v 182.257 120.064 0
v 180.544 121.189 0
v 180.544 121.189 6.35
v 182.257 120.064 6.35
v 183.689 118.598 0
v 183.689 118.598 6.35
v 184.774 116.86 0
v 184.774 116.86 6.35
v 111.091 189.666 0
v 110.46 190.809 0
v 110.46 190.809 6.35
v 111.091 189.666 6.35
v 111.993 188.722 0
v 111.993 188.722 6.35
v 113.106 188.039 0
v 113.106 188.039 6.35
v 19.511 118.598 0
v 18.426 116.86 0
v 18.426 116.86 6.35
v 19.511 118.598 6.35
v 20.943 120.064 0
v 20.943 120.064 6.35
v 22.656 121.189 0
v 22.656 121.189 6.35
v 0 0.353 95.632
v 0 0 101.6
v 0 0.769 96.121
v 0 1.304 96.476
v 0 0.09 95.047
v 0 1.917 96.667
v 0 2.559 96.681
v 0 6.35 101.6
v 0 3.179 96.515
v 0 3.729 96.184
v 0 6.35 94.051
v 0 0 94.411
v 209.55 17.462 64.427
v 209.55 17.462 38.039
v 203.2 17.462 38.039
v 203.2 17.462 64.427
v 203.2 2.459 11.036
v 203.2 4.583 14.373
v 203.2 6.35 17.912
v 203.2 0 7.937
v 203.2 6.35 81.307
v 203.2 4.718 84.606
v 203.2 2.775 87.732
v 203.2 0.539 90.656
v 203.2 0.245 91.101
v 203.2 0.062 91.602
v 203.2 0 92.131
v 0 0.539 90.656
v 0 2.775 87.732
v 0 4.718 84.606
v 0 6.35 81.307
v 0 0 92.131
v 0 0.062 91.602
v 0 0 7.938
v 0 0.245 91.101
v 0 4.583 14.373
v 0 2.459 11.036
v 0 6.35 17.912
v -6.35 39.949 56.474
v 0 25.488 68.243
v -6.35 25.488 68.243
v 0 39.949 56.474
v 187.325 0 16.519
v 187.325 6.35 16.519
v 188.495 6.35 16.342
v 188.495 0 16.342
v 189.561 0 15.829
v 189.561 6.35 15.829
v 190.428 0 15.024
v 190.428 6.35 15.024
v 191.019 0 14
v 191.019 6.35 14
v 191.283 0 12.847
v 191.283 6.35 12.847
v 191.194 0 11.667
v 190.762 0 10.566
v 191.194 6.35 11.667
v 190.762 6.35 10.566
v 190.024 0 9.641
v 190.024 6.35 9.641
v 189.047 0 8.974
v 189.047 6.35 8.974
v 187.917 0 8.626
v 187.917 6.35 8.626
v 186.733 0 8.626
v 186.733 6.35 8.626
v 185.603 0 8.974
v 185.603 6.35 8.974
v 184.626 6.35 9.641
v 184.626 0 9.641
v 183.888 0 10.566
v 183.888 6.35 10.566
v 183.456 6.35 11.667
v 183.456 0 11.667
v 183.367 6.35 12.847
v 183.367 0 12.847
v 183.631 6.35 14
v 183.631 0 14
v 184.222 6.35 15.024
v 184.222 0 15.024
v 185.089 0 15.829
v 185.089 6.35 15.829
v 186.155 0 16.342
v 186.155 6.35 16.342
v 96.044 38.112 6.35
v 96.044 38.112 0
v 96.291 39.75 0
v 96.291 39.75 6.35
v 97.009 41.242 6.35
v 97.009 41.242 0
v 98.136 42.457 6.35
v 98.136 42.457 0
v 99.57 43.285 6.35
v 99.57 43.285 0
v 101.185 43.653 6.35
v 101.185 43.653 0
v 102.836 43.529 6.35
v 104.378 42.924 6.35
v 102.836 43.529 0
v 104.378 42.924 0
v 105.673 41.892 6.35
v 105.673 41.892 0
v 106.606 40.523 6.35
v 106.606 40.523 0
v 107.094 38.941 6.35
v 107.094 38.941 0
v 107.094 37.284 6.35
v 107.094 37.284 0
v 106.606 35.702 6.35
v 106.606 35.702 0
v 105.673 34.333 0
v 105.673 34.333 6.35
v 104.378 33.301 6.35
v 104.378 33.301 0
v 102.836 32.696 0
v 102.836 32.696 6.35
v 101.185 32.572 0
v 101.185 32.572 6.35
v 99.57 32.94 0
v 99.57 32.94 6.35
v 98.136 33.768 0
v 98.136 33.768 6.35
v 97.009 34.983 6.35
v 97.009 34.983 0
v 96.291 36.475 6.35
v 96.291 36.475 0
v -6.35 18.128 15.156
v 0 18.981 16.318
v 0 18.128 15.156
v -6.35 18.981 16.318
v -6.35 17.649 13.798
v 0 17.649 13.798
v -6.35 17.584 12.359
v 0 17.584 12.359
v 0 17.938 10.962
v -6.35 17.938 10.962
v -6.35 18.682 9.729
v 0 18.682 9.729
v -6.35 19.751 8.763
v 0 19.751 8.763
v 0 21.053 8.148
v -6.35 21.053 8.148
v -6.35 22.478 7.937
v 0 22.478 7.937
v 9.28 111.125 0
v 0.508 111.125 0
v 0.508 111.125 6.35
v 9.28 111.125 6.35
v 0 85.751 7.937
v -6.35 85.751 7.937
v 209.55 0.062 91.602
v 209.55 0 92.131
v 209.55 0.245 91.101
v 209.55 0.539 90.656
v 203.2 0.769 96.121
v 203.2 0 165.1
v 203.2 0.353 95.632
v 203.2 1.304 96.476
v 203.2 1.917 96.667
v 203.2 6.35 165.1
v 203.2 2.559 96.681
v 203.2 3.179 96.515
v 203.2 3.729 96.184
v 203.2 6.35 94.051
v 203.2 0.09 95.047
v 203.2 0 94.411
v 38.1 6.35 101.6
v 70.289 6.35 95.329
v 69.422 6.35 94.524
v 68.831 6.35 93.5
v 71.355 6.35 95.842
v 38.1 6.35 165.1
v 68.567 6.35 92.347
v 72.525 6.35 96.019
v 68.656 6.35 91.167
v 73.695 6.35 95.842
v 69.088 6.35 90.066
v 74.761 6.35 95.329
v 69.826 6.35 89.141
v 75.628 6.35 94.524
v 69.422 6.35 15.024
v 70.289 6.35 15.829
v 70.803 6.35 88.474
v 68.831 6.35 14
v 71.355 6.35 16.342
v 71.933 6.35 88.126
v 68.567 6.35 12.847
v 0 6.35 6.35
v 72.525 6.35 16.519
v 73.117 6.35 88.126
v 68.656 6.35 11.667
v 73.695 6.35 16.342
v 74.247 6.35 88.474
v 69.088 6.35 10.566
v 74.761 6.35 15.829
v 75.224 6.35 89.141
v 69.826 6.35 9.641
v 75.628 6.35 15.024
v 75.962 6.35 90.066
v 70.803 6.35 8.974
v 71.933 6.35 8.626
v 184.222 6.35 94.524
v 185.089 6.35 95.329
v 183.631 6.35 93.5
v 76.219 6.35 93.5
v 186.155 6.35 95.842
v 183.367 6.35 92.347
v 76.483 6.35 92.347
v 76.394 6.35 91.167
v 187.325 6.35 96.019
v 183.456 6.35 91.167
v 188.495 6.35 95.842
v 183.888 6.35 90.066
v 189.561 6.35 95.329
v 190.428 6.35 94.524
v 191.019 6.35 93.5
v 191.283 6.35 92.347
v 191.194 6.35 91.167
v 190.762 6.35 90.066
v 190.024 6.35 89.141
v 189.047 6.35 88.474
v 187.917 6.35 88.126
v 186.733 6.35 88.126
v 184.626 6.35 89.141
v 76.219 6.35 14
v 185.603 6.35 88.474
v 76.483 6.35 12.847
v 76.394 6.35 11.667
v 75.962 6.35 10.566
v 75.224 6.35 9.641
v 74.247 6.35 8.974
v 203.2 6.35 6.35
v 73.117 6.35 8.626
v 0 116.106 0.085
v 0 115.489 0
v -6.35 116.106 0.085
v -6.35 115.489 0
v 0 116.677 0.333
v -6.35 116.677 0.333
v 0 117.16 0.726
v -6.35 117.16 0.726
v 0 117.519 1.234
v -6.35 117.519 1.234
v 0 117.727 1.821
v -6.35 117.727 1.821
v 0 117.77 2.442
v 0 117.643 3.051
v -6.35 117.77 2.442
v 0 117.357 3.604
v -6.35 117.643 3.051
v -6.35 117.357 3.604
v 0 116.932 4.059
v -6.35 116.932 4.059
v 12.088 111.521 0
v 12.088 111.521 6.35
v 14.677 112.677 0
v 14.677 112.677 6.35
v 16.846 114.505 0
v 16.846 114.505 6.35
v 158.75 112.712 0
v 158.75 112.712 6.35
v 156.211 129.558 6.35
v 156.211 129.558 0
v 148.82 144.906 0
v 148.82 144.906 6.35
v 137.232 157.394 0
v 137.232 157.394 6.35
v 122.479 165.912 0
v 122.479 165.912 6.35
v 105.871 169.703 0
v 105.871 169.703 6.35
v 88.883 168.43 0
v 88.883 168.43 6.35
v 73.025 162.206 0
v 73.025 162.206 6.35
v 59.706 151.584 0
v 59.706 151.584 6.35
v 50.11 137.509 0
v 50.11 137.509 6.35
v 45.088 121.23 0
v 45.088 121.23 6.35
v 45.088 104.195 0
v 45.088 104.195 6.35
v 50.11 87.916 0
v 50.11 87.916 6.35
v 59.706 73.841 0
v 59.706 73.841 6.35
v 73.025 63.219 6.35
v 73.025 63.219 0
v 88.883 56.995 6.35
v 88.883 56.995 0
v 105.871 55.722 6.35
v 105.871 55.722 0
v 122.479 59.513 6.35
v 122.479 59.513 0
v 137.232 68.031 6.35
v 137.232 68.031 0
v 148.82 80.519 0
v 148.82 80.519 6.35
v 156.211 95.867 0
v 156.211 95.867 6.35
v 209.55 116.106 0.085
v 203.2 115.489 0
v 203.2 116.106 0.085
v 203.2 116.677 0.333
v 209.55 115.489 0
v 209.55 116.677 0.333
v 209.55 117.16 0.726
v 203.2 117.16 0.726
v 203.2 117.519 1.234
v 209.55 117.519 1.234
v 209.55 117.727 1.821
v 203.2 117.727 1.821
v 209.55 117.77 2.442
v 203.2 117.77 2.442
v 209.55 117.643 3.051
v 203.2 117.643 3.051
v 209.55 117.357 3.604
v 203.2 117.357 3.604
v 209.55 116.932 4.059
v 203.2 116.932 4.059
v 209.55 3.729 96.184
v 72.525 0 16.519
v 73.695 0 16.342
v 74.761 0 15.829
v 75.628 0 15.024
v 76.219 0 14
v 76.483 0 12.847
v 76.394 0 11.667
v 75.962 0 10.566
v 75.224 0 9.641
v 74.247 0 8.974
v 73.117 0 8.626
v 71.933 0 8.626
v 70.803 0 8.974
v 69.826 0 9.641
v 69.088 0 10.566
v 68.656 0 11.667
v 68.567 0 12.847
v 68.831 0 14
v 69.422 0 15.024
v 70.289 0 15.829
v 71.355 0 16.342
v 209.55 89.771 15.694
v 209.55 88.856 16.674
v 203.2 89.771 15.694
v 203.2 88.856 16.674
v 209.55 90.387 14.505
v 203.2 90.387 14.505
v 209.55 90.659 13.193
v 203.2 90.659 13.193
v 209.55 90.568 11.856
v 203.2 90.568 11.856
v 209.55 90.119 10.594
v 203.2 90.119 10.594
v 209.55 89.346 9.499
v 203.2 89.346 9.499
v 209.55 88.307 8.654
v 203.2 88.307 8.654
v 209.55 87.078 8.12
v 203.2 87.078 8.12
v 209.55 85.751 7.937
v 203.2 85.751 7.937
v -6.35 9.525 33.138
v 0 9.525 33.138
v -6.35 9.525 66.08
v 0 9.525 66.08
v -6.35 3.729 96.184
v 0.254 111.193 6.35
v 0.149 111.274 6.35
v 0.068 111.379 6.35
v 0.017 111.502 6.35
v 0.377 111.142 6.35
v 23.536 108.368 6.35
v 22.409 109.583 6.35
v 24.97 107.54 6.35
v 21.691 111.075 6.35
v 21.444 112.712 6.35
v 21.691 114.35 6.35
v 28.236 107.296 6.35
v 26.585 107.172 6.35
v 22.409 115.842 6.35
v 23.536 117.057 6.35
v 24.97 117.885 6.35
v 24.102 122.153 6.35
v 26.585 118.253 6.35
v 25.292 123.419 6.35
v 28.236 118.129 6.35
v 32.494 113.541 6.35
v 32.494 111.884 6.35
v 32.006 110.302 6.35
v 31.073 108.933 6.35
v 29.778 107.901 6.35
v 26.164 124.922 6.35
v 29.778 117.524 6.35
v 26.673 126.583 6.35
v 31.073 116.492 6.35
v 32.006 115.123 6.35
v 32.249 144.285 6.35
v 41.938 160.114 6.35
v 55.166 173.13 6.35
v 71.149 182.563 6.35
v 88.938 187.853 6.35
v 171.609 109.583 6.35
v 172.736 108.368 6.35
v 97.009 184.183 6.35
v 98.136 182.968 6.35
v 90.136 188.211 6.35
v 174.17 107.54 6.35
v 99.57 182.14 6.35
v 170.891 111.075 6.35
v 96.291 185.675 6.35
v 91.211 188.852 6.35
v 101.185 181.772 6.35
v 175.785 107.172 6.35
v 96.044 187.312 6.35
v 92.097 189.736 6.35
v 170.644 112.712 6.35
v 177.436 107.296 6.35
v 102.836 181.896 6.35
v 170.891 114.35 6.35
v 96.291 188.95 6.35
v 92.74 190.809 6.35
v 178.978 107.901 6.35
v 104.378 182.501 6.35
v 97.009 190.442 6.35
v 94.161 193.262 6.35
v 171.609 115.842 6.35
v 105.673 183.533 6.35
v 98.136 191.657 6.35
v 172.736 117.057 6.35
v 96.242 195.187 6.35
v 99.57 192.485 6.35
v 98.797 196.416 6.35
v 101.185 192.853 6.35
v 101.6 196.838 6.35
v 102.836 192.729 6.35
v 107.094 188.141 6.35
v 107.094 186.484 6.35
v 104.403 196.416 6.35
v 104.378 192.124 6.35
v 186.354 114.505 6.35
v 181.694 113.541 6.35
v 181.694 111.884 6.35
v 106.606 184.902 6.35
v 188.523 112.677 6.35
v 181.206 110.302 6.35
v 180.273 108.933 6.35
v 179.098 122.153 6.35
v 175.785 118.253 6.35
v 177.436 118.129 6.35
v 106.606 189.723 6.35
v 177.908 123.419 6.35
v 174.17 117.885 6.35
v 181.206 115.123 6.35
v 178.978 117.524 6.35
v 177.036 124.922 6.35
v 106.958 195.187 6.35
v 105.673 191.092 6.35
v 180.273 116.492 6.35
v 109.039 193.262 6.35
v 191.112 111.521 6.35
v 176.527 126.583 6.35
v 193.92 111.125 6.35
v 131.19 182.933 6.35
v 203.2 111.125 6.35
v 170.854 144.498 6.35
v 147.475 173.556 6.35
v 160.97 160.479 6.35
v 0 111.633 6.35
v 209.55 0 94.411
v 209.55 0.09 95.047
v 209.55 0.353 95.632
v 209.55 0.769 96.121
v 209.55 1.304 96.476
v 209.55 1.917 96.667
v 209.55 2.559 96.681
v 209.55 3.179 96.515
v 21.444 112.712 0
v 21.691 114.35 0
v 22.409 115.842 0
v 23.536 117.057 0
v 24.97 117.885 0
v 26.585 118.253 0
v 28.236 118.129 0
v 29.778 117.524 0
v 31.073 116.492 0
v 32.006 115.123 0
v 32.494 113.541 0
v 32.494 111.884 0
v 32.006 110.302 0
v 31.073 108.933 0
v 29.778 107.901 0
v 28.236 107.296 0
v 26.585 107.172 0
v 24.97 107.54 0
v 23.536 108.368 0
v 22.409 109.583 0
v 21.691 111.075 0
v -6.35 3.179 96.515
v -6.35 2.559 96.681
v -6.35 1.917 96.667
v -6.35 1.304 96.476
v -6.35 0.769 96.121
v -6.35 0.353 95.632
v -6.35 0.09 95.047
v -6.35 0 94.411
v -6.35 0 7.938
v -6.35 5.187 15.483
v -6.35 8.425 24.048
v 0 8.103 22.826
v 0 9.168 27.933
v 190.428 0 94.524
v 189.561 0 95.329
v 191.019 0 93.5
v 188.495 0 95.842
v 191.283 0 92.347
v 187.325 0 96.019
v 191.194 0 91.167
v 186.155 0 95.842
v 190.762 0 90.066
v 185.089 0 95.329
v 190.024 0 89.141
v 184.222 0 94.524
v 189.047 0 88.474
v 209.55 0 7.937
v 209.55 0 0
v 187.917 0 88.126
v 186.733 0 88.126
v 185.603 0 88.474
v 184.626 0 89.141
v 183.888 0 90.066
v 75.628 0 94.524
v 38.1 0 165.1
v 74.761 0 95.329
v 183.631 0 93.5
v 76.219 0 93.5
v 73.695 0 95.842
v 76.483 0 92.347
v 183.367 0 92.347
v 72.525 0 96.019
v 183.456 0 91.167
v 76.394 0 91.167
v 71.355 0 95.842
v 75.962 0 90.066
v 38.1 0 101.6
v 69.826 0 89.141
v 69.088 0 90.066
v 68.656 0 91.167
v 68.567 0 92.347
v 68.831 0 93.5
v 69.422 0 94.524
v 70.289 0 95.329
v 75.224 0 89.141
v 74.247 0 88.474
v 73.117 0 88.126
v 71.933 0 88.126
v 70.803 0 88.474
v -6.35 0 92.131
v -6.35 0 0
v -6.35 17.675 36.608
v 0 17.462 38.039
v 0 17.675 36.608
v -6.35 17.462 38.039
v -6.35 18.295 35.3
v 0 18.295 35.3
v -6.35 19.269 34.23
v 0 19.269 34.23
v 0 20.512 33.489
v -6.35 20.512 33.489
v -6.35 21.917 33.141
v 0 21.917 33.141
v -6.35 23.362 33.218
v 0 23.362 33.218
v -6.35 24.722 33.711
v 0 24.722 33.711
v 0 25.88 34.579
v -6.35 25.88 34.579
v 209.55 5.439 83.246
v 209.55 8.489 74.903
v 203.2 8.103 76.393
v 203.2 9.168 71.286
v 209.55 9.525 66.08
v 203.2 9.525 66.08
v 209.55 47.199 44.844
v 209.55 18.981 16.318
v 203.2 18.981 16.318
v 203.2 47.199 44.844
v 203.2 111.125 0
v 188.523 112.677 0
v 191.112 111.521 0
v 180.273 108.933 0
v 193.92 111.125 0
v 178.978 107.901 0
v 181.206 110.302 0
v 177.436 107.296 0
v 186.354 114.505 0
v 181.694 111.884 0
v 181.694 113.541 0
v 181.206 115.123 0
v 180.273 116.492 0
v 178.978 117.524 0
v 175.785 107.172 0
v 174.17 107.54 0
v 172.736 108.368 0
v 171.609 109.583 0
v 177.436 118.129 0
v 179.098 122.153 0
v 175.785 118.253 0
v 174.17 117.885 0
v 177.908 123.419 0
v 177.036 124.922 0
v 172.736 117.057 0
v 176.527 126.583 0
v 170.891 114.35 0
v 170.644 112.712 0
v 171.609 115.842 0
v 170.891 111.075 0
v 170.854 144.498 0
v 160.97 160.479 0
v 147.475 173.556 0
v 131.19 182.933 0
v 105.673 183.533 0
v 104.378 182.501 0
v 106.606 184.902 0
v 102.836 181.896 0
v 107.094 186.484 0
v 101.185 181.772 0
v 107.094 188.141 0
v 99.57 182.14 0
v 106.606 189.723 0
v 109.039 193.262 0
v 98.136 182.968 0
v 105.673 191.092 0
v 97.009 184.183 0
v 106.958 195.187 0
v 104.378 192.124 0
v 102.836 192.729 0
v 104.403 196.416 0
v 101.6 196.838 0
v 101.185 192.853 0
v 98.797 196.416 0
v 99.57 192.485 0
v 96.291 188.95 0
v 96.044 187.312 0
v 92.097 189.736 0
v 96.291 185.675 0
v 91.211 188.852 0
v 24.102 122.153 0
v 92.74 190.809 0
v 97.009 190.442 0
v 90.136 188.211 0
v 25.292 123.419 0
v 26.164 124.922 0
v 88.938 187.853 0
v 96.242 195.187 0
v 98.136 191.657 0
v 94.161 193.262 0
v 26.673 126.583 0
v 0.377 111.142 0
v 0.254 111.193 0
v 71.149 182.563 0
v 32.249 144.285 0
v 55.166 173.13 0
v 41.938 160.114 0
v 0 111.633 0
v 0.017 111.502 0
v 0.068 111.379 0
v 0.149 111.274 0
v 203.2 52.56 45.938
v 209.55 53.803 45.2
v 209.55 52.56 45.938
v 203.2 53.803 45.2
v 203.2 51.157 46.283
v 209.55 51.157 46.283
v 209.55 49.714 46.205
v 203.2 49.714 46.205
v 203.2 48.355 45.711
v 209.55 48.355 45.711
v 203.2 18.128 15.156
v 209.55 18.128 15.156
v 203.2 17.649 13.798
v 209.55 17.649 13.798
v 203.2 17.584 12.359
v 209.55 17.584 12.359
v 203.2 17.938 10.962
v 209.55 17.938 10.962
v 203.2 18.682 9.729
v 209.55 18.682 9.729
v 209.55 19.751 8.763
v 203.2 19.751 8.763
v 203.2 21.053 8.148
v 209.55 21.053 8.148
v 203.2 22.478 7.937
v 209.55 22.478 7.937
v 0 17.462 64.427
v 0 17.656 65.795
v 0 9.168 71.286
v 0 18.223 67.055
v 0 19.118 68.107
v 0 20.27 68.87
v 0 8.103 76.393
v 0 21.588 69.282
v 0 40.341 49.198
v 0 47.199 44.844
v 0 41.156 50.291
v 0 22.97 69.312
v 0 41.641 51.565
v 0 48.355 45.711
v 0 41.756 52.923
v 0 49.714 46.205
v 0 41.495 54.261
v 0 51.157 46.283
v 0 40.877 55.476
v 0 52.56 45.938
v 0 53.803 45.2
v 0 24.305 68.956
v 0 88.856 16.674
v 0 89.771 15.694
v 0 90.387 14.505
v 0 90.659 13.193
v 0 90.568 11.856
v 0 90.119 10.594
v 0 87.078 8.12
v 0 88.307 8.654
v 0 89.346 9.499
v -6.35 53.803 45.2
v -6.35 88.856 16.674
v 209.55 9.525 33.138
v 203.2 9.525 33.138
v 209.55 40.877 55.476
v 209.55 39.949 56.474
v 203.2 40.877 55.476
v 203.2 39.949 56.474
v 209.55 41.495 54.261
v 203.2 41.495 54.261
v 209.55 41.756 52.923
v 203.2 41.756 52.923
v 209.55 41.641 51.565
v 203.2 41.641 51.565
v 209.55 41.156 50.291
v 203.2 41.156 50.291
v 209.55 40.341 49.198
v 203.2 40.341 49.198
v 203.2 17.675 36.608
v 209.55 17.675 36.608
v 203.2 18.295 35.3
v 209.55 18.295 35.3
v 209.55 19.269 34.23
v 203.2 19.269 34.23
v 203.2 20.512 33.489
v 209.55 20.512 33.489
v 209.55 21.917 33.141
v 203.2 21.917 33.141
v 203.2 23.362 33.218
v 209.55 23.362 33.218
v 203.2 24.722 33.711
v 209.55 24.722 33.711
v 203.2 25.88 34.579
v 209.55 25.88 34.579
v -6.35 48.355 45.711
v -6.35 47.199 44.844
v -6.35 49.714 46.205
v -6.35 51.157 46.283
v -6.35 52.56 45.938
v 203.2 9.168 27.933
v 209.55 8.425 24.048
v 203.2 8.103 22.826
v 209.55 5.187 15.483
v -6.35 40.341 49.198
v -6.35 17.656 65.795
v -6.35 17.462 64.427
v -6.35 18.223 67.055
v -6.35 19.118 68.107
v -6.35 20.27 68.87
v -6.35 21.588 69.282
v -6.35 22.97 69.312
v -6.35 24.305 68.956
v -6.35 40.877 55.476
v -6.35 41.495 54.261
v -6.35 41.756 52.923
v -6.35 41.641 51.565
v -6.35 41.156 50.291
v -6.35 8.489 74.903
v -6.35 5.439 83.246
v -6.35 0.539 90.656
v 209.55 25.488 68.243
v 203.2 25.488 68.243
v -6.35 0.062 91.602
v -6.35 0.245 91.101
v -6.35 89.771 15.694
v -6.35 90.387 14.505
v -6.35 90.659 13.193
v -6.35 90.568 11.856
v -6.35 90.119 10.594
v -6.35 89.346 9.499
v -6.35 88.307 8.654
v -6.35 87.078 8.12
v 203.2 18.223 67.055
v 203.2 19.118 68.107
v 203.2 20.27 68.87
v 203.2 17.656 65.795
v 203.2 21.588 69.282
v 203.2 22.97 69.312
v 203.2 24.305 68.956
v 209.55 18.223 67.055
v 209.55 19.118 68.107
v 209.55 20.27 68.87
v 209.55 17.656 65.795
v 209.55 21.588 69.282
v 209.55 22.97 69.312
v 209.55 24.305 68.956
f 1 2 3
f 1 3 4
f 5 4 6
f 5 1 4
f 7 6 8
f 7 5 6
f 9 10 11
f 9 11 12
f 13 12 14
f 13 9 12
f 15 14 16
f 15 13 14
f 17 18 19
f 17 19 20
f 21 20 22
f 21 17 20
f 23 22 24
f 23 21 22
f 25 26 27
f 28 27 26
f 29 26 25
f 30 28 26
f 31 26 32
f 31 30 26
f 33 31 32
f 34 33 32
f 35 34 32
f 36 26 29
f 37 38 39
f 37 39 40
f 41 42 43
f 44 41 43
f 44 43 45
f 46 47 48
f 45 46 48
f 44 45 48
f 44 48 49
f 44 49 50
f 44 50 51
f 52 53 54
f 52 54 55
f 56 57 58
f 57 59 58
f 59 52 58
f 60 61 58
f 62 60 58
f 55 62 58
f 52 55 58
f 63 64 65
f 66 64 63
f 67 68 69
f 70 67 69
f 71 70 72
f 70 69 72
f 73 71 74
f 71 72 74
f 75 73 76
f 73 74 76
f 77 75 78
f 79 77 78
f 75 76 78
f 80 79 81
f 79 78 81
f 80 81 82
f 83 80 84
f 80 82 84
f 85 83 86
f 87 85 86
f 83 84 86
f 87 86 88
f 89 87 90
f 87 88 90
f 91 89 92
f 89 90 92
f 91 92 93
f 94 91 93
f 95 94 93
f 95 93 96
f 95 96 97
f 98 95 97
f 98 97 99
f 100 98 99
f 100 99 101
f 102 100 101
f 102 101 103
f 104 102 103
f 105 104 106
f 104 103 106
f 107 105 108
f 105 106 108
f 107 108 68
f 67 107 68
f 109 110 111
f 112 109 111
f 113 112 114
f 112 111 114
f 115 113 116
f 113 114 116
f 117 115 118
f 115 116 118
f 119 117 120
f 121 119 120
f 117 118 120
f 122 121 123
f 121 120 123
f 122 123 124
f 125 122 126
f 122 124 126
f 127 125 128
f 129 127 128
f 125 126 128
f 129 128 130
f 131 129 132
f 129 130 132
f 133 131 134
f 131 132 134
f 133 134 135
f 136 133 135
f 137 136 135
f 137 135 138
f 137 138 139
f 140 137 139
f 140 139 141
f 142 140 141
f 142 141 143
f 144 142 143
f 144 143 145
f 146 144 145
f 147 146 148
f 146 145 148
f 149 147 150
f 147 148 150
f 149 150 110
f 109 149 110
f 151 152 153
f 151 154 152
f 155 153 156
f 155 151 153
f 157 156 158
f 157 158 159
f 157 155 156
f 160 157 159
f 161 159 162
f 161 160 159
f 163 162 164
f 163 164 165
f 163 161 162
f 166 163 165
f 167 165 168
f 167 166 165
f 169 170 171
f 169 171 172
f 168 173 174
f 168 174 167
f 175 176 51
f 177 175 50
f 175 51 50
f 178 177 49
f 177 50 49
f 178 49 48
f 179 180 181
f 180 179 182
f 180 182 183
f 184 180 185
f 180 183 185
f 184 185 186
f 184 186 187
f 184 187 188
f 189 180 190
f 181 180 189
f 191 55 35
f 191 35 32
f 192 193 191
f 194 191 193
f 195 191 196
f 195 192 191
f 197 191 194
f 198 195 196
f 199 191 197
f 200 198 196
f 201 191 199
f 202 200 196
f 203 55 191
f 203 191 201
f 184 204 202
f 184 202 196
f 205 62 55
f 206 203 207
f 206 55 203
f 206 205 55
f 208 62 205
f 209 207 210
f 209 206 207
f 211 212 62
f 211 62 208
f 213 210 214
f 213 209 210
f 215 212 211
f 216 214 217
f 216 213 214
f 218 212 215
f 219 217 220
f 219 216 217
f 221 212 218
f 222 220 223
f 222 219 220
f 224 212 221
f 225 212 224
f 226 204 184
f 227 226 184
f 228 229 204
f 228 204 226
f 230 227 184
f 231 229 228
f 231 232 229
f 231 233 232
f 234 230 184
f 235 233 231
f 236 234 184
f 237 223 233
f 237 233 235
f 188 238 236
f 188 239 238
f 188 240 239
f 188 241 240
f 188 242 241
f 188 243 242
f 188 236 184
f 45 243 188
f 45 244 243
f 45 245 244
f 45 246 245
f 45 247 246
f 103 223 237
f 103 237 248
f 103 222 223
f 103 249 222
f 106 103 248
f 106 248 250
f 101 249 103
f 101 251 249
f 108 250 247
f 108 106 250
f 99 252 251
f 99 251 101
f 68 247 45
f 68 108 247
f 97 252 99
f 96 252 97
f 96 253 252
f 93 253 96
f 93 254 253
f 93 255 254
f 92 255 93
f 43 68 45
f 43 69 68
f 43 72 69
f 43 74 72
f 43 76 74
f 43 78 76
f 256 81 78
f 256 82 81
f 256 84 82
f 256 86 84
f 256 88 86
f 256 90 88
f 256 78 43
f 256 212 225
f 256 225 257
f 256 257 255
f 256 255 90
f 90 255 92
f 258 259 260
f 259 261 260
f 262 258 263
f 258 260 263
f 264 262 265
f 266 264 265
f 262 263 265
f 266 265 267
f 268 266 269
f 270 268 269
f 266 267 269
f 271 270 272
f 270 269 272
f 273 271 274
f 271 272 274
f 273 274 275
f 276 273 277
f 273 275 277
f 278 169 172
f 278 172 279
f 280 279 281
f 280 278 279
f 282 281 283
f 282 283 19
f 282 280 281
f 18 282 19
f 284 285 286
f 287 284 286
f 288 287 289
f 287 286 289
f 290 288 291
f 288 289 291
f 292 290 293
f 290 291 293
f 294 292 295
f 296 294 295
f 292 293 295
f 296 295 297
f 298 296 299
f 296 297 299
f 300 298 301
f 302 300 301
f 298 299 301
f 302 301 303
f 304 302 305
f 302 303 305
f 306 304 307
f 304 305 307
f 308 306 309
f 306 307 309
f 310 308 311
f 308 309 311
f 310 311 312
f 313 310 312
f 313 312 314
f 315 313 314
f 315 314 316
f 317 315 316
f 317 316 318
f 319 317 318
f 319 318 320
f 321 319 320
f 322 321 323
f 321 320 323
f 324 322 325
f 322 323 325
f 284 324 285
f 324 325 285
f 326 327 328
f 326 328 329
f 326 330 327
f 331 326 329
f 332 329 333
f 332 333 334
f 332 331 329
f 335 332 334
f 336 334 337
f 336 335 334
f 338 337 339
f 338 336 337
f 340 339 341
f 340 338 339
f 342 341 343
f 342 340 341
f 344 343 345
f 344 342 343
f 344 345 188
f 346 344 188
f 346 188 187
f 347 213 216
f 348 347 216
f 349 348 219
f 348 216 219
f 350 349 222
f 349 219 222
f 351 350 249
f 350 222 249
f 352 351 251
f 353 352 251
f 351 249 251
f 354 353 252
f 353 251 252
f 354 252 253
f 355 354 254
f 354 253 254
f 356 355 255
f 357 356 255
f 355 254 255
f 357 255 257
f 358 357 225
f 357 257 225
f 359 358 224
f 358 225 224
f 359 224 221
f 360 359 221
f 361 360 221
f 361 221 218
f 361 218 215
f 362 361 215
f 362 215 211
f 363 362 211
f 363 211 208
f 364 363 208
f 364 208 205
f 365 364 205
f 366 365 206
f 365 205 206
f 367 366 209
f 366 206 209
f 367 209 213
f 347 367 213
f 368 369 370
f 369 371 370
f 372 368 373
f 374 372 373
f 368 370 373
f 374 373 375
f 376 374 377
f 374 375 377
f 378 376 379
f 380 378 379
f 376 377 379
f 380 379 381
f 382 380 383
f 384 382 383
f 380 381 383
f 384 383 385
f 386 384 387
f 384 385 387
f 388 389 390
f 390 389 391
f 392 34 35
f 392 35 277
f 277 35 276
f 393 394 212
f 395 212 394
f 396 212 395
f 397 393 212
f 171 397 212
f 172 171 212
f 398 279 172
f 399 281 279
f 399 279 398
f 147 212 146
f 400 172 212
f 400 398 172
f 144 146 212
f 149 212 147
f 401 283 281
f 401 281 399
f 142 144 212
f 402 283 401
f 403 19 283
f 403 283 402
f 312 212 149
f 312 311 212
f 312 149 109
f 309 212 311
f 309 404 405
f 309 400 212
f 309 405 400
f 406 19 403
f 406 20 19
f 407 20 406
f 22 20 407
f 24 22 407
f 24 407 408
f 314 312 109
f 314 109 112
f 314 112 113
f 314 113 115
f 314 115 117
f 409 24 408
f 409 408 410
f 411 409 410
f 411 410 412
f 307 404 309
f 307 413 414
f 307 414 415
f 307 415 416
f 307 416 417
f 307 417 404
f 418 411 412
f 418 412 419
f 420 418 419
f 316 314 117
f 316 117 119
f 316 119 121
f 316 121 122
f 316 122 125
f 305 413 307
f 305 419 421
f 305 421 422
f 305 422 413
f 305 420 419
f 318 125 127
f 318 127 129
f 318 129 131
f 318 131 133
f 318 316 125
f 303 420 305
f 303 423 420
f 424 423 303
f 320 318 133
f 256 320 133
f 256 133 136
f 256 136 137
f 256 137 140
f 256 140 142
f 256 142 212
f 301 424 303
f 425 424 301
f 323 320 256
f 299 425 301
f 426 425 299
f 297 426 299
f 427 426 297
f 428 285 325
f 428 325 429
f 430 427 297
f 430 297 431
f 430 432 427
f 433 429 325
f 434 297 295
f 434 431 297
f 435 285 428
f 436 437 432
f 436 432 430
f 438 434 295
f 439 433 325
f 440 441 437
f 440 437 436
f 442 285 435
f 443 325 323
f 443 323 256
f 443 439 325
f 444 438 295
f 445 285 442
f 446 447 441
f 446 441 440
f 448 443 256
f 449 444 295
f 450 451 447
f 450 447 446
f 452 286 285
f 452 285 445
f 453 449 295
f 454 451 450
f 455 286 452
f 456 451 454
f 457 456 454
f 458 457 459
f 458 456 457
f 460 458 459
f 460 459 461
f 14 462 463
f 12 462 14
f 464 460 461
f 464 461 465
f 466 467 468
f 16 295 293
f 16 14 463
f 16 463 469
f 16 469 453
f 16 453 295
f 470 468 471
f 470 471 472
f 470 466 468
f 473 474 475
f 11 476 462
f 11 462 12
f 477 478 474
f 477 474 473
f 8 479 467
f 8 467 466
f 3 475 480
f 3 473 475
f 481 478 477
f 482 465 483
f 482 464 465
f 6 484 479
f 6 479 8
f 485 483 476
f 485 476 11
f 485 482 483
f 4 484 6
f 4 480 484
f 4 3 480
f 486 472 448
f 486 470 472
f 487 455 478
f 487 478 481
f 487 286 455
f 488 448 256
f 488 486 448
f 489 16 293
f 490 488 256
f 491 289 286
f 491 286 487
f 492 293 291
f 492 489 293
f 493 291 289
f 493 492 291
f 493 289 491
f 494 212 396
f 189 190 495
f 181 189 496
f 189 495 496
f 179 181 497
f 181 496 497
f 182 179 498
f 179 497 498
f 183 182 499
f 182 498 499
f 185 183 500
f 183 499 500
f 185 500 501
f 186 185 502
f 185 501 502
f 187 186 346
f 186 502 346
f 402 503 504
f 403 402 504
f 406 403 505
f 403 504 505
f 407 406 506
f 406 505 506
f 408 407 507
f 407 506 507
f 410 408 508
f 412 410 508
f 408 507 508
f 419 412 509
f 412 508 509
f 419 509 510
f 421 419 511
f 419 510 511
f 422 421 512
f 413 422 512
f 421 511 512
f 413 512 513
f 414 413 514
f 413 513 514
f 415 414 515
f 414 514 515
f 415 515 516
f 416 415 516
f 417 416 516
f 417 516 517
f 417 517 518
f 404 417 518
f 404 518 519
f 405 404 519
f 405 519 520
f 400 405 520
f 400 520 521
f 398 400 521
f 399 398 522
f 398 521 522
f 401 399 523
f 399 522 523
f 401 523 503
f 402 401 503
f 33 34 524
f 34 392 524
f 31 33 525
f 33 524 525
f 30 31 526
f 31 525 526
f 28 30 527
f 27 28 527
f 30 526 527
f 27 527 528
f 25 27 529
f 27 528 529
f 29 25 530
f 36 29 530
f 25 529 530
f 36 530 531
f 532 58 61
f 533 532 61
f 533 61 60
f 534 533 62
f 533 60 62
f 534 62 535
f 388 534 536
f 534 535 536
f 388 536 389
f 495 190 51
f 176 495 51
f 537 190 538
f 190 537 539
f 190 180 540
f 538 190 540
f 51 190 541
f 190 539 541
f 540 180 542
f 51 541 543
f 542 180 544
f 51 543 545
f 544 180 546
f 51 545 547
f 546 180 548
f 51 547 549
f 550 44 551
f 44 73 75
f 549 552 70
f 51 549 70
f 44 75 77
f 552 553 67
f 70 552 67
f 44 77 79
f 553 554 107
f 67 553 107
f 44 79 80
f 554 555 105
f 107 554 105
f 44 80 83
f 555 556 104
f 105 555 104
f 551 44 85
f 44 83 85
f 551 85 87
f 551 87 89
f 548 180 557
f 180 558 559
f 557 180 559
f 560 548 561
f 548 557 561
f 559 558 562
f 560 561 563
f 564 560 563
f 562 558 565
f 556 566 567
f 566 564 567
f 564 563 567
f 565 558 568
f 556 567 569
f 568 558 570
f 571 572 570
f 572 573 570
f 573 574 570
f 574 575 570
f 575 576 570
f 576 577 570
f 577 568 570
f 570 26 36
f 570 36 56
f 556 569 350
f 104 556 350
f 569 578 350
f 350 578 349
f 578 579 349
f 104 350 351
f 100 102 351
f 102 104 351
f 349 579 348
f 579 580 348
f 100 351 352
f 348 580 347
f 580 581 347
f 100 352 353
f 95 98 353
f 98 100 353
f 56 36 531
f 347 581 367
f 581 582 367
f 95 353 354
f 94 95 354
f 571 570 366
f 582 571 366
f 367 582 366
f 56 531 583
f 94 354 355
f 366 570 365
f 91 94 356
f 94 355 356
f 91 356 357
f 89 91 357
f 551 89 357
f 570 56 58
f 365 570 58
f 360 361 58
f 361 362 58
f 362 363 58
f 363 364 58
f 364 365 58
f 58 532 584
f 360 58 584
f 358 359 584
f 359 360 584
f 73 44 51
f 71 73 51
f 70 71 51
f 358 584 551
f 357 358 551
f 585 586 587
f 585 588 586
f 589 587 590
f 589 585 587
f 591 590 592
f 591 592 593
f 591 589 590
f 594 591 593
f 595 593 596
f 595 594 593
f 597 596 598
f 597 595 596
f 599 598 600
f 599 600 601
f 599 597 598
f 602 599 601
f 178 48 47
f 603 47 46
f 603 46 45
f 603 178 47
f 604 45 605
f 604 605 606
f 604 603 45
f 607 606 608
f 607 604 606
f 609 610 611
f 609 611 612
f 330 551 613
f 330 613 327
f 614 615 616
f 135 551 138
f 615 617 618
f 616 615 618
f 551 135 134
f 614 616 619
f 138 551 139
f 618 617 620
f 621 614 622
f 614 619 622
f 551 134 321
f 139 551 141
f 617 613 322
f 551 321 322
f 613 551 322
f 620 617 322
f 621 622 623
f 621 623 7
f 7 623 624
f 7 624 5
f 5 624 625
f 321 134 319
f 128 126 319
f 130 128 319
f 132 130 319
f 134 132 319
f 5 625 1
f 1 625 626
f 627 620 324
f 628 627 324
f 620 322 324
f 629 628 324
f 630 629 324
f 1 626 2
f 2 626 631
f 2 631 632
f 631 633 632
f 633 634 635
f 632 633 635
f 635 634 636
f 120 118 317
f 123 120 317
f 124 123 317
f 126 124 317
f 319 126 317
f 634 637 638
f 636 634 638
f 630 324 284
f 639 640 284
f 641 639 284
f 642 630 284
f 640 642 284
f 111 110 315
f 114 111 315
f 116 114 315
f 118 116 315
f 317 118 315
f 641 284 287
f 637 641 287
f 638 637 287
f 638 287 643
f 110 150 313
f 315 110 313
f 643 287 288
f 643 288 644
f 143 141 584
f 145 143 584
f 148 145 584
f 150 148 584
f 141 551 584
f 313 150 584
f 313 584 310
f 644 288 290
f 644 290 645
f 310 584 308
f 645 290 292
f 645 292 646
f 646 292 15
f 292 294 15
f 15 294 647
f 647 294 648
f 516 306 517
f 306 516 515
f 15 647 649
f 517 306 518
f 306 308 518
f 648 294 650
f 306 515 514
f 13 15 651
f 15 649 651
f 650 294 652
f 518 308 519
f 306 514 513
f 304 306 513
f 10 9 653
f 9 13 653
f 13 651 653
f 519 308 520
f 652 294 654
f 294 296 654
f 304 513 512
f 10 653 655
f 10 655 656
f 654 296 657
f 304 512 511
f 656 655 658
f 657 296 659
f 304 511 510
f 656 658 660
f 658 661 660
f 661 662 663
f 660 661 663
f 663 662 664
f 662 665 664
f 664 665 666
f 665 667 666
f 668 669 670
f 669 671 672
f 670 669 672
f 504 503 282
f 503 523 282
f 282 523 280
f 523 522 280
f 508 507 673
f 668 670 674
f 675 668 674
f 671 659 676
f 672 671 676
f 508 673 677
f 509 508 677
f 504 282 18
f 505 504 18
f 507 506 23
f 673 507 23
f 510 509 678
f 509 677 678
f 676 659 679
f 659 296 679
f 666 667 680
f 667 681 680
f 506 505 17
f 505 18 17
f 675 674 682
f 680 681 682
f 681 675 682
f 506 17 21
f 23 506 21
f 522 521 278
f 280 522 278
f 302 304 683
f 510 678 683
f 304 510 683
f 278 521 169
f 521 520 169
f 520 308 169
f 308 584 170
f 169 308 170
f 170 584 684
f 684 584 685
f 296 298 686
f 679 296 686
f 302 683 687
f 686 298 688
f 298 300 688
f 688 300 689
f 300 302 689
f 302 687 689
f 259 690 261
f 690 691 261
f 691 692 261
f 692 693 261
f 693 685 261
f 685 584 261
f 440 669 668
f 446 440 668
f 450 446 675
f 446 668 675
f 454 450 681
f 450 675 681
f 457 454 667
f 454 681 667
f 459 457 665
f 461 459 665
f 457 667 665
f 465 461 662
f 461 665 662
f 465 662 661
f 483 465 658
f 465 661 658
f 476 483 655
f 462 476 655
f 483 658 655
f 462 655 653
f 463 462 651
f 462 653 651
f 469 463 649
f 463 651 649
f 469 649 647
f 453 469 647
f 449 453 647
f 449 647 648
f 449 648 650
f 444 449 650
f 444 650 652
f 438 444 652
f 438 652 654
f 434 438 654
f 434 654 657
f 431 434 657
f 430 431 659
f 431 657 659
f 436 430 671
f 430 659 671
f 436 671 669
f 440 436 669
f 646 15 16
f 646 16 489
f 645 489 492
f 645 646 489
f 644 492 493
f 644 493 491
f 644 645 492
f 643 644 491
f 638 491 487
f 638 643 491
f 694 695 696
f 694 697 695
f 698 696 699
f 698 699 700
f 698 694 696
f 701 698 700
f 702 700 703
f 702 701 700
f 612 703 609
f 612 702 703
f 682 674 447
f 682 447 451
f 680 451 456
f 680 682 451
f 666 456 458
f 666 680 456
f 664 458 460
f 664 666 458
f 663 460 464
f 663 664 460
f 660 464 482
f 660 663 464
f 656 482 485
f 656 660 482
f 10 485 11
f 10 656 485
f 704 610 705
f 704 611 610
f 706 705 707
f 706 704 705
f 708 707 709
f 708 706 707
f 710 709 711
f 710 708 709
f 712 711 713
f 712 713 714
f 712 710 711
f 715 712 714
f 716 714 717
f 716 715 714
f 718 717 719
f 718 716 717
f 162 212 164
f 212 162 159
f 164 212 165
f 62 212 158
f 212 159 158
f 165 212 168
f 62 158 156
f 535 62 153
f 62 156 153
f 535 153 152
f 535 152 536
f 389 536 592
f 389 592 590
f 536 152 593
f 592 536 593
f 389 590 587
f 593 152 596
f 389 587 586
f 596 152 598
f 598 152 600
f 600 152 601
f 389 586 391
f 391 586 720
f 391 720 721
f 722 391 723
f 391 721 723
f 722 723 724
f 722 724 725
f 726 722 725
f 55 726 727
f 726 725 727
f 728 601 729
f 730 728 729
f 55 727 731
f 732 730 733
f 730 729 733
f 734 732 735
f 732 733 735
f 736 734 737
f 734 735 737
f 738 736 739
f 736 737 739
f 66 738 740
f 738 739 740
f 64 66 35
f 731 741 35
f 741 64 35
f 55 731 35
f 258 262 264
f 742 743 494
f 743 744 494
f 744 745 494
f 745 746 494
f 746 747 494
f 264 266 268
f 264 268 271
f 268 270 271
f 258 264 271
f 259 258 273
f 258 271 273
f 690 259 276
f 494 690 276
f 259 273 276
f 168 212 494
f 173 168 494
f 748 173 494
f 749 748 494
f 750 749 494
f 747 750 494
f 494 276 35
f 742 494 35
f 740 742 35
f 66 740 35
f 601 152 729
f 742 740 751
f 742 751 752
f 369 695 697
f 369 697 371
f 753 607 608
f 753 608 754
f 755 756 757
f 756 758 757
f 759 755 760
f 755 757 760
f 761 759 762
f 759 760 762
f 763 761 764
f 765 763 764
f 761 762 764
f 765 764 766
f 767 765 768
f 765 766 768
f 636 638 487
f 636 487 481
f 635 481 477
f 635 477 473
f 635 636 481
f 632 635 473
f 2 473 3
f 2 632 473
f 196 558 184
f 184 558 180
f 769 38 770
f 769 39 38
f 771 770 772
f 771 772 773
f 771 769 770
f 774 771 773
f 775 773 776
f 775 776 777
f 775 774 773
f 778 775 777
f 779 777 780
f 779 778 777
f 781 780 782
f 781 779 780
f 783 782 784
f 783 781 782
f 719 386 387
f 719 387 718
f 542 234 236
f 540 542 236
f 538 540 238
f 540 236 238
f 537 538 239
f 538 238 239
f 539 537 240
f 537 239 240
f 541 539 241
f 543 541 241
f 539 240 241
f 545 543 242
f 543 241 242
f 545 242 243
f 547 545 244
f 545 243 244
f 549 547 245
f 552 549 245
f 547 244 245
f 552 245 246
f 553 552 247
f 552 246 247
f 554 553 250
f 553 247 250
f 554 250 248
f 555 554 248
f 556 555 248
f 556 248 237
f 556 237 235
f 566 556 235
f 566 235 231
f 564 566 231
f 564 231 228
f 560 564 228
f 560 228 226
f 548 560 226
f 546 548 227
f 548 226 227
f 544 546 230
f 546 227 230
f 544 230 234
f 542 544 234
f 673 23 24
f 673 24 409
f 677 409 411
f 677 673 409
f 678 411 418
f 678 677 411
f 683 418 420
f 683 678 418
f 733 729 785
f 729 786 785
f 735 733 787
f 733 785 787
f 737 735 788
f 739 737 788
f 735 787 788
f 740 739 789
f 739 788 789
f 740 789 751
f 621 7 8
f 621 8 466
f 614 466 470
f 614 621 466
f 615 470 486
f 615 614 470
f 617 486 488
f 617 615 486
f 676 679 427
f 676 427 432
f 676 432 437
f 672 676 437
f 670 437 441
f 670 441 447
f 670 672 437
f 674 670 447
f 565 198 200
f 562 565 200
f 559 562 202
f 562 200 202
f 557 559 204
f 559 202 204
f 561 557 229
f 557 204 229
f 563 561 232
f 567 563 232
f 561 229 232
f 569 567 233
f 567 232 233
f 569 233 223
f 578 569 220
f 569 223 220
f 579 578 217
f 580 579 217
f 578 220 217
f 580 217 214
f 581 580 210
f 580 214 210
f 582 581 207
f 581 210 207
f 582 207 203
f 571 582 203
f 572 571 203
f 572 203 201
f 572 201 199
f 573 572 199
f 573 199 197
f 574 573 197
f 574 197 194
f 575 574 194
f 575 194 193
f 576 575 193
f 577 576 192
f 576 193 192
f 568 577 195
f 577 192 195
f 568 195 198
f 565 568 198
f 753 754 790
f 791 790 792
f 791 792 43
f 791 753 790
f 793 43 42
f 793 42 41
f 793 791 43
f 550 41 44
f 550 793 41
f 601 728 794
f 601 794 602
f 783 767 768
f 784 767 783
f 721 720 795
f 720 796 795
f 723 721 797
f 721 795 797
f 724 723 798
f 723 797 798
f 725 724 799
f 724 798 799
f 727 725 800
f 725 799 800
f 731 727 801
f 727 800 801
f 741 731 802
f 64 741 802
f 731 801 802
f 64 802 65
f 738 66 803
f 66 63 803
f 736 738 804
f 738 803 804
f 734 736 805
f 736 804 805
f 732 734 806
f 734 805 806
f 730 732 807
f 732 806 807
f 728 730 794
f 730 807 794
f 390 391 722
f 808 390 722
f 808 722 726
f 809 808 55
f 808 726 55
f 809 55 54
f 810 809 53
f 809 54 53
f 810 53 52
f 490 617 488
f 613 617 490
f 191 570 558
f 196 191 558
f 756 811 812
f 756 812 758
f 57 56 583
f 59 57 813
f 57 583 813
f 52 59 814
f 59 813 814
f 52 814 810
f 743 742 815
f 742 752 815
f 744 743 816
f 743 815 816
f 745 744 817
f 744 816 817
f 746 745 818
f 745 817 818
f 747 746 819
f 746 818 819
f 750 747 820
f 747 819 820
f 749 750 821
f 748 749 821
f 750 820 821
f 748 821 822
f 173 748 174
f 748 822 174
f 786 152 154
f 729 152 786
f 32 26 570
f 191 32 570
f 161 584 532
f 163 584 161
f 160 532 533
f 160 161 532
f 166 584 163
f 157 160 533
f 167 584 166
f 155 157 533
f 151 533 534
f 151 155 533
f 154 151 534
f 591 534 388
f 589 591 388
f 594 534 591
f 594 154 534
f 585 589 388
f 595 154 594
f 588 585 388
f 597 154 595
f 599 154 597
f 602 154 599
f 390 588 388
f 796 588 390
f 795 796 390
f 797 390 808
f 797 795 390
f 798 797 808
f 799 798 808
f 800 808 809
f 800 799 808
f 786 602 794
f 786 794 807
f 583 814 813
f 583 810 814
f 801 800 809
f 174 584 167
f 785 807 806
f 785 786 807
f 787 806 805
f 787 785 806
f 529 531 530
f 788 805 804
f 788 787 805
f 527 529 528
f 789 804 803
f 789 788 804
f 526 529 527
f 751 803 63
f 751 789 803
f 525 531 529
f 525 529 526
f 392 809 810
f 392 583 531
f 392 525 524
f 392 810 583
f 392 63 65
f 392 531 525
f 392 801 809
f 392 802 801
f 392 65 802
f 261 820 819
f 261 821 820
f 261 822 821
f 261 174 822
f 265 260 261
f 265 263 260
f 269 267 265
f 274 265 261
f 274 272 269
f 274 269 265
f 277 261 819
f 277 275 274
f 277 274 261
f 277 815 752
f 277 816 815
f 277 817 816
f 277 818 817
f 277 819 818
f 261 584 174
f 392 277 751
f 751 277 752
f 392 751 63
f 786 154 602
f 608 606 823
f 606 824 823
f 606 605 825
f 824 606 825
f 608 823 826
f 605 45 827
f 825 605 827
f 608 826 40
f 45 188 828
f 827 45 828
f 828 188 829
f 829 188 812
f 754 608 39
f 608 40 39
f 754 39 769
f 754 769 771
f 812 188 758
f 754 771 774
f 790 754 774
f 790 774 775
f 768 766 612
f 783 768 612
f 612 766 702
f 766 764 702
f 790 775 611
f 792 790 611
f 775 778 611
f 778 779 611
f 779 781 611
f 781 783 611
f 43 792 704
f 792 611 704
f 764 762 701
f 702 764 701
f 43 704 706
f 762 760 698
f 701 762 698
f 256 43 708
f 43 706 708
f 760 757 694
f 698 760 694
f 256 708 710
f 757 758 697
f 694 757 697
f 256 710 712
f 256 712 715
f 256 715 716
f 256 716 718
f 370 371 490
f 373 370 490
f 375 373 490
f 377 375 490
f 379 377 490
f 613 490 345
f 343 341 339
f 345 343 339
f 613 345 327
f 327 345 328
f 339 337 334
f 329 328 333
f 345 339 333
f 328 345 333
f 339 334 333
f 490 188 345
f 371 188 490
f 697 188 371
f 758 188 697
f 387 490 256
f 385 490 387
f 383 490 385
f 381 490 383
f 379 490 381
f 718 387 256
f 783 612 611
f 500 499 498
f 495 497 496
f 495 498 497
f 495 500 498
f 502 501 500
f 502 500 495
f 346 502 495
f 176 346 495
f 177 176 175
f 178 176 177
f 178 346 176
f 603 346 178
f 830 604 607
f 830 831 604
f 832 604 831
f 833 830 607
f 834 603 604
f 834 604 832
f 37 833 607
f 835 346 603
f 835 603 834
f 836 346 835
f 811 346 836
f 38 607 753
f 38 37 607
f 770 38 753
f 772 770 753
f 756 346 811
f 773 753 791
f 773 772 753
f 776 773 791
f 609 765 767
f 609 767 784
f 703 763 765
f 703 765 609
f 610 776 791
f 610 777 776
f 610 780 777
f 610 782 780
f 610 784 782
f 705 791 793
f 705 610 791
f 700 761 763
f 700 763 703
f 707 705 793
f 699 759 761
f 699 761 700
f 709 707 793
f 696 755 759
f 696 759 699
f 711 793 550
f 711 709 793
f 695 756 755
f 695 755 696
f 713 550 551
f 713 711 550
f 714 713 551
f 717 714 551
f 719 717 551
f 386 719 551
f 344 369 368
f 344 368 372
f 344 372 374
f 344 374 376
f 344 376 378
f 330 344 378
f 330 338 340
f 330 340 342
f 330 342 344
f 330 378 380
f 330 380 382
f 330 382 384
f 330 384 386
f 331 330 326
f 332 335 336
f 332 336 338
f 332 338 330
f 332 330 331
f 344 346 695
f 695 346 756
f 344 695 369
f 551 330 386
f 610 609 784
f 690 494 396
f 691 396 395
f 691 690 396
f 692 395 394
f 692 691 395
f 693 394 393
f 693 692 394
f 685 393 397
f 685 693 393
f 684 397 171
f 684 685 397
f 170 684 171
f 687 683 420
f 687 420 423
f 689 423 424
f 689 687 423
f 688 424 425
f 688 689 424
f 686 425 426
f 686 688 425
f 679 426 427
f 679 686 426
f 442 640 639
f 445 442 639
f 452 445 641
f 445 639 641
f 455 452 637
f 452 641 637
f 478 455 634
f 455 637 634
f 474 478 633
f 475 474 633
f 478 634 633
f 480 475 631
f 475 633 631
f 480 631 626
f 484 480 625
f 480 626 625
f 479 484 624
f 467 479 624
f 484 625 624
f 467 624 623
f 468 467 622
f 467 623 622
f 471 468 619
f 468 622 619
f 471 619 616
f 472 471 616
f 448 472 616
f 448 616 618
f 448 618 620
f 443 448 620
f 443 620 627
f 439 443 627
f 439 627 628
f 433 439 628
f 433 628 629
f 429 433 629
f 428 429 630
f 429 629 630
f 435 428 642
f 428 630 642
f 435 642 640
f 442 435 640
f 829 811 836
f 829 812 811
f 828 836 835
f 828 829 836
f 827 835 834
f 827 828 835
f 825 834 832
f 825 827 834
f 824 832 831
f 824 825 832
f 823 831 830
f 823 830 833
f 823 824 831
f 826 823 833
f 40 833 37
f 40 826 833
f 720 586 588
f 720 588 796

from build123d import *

# Parameters (mm, degrees)
BOSS_EXTRUDE1_DEPTH = 6.35
SKETCH3_W           = 203.2
SKETCH3_H           = 190.5
BOSS_EXTRUDE2_DEPTH = 6.35
SKETCH4_R           = 57.15
CUT_EXTRUDE1_DEPTH  = 6.35
SKETCH5_R           = 5.55625
CUT_EXTRUDE2_DEPTH  = 6.35
CUT_EXTRUDE3_DEPTH  = 6.35
SKETCH7_R           = 3.96875
CUT_EXTRUDE4_DEPTH  = 6.35
BOSS_EXTRUDE3_DEPTH = 6.35
BOSS_EXTRUDE4_DEPTH = 6.35
CUT_EXTRUDE5_DEPTH  = 6.35
CUT_EXTRUDE6_START  = -6.35
CUT_EXTRUDE6_DEPTH  = 6.35
CUT_EXTRUDE7_DEPTH  = 336.582808568
FILLET1_R           = 4.92
FILLET4_R           = 2.286
FILLET6_R           = 0.508


with BuildPart() as part:
    # Sketch2 → Boss-Extrude1 (new body)
    with BuildSketch(Plane(origin=(0, 0, 0), x_dir=(1, 0, 0), z_dir=(0, 1, 0))):
        Polygon((0, 0), (0, -101.6), (38.1, -101.6), (38.1, -165.1), (203.2, -165.1), (203.2, 0), align=None)
    extrude(amount=BOSS_EXTRUDE1_DEPTH)

    # Sketch3 → Boss-Extrude2 (add)
    with BuildSketch(Plane.XY):
        with Locations((101.6, 101.6)):
            Rectangle(SKETCH3_W, SKETCH3_H)
    extrude(amount=BOSS_EXTRUDE2_DEPTH)

    # Sketch4 → Cut-Extrude1 (cut)
    with BuildSketch(Plane.XY.offset(6.35)):
        with Locations((101.6, 112.7125)):
            Circle(SKETCH4_R)
    extrude(amount=-CUT_EXTRUDE1_DEPTH, mode=Mode.SUBTRACT)

    # Sketch5 → Cut-Extrude2 (cut)
    with BuildSketch(Plane(origin=(0, 0, 0), x_dir=(-1, 0, 0), z_dir=(0, 0, -1))):
        with Locations((-101.6, 38.1125)):
            Circle(SKETCH5_R)
        with Locations((-101.6, 187.3125)):
            Circle(SKETCH5_R)
        with Locations((-27, 112.7125)):
            Circle(SKETCH5_R)
        with Locations((-176.2, 112.7125)):
            Circle(SKETCH5_R)
    extrude(amount=-CUT_EXTRUDE2_DEPTH, mode=Mode.SUBTRACT)

    # Sketch6 → Cut-Extrude3 (cut)
    with BuildSketch(Plane(origin=(0, 0, 0), x_dir=(-1, 0, 0), z_dir=(0, 0, -1))):
        with BuildLine():
            Line((0, 111.125), (-9.279631247, 111.125))
            ThreePointArc((-9.279631247, 111.125), (-14.677432472, 112.677483405), (-18.425628023, 116.860483871))
            ThreePointArc((-18.425628023, 116.860483871), (-20.187748704, 119.369740966), (-22.655788744, 121.189141644))
            ThreePointArc((-22.655788744, 121.189141644), (-25.29180212, 123.419037006), (-26.673108853, 126.583368145))
            ThreePointArc((-26.673108853, 126.583368145), (-48.154111696, 167.026190939), (-88.937645626, 187.853066818))
            ThreePointArc((-88.937645626, 187.853066818), (-91.211372645, 188.851802141), (-92.739976476, 190.809013713))
            ThreePointArc((-92.739976476, 190.809013713), (-101.6, 196.8375), (-110.460023524, 190.809013713))
            ThreePointArc((-110.460023524, 190.809013713), (-111.511997393, 189.164869891), (-113.106279584, 188.038760561))
            ThreePointArc((-113.106279584, 188.038760561), (-154.627017311, 167.435214069), (-176.526891147, 126.583368145))
            ThreePointArc((-176.526891147, 126.583368145), (-177.90819788, 123.419037006), (-180.544211256, 121.189141644))
            ThreePointArc((-180.544211256, 121.189141644), (-183.012251296, 119.369740966), (-184.774371977, 116.860483871))
            ThreePointArc((-184.774371977, 116.860483871), (-188.522567528, 112.677483405), (-193.920368753, 111.125))
            Line((-193.920368753, 111.125), (-203.2, 111.125))
            Line((-203.2, 111.125), (-224.605111479, 111.125))
            Line((-224.605111479, 111.125), (-224.605111479, 212.995219786))
            Line((-224.605111479, 212.995219786), (24.443830007, 212.995219786))
            Line((24.443830007, 212.995219786), (24.443830007, 111.125))
            Line((24.443830007, 111.125), (0, 111.125))
        make_face()
    extrude(amount=-CUT_EXTRUDE3_DEPTH, mode=Mode.SUBTRACT)

    # Sketch7 → Cut-Extrude4 (cut)
    with BuildSketch(Plane(origin=(0, 6.35, 0), x_dir=(1, 0, 0), z_dir=(0, 1, 0))):
        with Locations(Location((187.325, -92.05, 0), (0, 0, 270))):
            Circle(SKETCH7_R)
        with Locations(Location((187.325, -12.55, 0), (0, 0, 270))):
            Circle(SKETCH7_R)
        with Locations(Location((72.525, -12.55, 0), (0, 0, 270))):
            Circle(SKETCH7_R)
        with Locations(Location((72.525, -92.05, 0), (0, 0, 270))):
            Circle(SKETCH7_R)
    extrude(amount=-CUT_EXTRUDE4_DEPTH, mode=Mode.SUBTRACT)

    # Sketch8 → Boss-Extrude3 (add)
    with BuildSketch(Plane(origin=(0, 0, 0), x_dir=(0, 0, -1), z_dir=(1, 0, 0))):
        Polygon((0, 0), (-99.21875, 0), (0, 121.92), align=None)
    extrude(amount=-BOSS_EXTRUDE3_DEPTH)

    # Sketch10 → Boss-Extrude4 (add)
    with BuildSketch(Plane(origin=(203.2, 0, 0), x_dir=(0, 0, -1), z_dir=(1, 0, 0))):
        Polygon((-99.21875, 0), (0, 0), (0, 121.92), align=None)
    extrude(amount=BOSS_EXTRUDE4_DEPTH)

    # Sketch11 → Cut-Extrude5 (cut)
    with BuildSketch(Plane(origin=(209.55, 0, 0), x_dir=(0, 0, -1), z_dir=(1, 0, 0))):
        with BuildLine():
            Line((-7.9375, 0), (-91.28125, 0))
            ThreePointArc((-91.28125, 0), (-79.550852944, 7.064286609), (-66.080468762, 9.525))
            Line((-66.080468762, 9.525), (-33.138281238, 9.525))
            ThreePointArc((-33.138281238, 9.525), (-19.667897056, 7.064286609), (-7.9375, 0))
        make_face()
    extrude(amount=-CUT_EXTRUDE5_DEPTH, mode=Mode.SUBTRACT)

    # Sketch12 → Cut-Extrude6 (cut)
    with BuildSketch(Plane.ZY.offset(6.35).offset(CUT_EXTRUDE6_START)):
        with BuildLine():
            Line((91.28125, 0), (7.9375, 0))
            ThreePointArc((7.9375, 0), (19.667897056, 7.064286609), (33.138281238, 9.525))
            Line((33.138281238, 9.525), (66.080468762, 9.525))
            ThreePointArc((66.080468762, 9.525), (79.550852944, 7.064286609), (91.28125, 0))
        make_face()
    extrude(amount=CUT_EXTRUDE6_DEPTH, mode=Mode.SUBTRACT)

    # Sketch13 → Cut-Extrude7 (cut, through all)
    with BuildSketch(Plane(origin=(209.55, 0, 0), x_dir=(0, 0, -1), z_dir=(1, 0, 0))):
        Polygon((-7.9375, 99.591161664), (-7.9375, 10.691161664), (-48.018748286, 50.339323771), align=None)
        Polygon((-53.052501721, 44.153847549), (-26.069598319, 17.4625), (-74.773975963, 17.4625), align=None)
    extrude(amount=-CUT_EXTRUDE7_DEPTH, mode=Mode.SUBTRACT)

    # Fillet1
    fillet1_edges = [part.edges().sort_by_distance(p)[0] for p in [
        (206.375, 50.339323771, 48.018748286),
        (-3.175, 50.339323771, 48.018748286),
        (206.375, 99.591161664, 7.9375),
        (-3.175, 99.591161664, 7.9375),
        (206.375, 10.691161664, 7.9375),
        (-3.175, 10.691161664, 7.9375),
        (206.375, 44.153847549, 53.052501721),
        (-3.175, 44.153847549, 53.052501721),
        (206.375, 17.4625, 26.069598319),
        (-3.175, 17.4625, 26.069598319),
        (206.375, 17.4625, 74.773975963),
        (-3.175, 17.4625, 74.773975963),
    ]]
    fillet(fillet1_edges, radius=FILLET1_R)

    # Fillet4
    fillet4_edges = [part.edges().sort_by_distance(p)[0] for p in [
        (-3.175, 121.92, 0),
        (-3.175, 0, 99.21875),
        (206.375, 121.92, 0),
        (206.375, 0, 99.21875),
        (206.375, 0, 91.28125),
        (-3.175, 0, 91.28125),
    ]]
    fillet(fillet4_edges, radius=FILLET4_R)

    # Fillet6
    fillet6_edges = [part.edges().sort_by_distance(p)[0] for p in [
        (0, 111.125, 3.175),
    ]]
    fillet(fillet6_edges, radius=FILLET6_R)


solid = part.part
